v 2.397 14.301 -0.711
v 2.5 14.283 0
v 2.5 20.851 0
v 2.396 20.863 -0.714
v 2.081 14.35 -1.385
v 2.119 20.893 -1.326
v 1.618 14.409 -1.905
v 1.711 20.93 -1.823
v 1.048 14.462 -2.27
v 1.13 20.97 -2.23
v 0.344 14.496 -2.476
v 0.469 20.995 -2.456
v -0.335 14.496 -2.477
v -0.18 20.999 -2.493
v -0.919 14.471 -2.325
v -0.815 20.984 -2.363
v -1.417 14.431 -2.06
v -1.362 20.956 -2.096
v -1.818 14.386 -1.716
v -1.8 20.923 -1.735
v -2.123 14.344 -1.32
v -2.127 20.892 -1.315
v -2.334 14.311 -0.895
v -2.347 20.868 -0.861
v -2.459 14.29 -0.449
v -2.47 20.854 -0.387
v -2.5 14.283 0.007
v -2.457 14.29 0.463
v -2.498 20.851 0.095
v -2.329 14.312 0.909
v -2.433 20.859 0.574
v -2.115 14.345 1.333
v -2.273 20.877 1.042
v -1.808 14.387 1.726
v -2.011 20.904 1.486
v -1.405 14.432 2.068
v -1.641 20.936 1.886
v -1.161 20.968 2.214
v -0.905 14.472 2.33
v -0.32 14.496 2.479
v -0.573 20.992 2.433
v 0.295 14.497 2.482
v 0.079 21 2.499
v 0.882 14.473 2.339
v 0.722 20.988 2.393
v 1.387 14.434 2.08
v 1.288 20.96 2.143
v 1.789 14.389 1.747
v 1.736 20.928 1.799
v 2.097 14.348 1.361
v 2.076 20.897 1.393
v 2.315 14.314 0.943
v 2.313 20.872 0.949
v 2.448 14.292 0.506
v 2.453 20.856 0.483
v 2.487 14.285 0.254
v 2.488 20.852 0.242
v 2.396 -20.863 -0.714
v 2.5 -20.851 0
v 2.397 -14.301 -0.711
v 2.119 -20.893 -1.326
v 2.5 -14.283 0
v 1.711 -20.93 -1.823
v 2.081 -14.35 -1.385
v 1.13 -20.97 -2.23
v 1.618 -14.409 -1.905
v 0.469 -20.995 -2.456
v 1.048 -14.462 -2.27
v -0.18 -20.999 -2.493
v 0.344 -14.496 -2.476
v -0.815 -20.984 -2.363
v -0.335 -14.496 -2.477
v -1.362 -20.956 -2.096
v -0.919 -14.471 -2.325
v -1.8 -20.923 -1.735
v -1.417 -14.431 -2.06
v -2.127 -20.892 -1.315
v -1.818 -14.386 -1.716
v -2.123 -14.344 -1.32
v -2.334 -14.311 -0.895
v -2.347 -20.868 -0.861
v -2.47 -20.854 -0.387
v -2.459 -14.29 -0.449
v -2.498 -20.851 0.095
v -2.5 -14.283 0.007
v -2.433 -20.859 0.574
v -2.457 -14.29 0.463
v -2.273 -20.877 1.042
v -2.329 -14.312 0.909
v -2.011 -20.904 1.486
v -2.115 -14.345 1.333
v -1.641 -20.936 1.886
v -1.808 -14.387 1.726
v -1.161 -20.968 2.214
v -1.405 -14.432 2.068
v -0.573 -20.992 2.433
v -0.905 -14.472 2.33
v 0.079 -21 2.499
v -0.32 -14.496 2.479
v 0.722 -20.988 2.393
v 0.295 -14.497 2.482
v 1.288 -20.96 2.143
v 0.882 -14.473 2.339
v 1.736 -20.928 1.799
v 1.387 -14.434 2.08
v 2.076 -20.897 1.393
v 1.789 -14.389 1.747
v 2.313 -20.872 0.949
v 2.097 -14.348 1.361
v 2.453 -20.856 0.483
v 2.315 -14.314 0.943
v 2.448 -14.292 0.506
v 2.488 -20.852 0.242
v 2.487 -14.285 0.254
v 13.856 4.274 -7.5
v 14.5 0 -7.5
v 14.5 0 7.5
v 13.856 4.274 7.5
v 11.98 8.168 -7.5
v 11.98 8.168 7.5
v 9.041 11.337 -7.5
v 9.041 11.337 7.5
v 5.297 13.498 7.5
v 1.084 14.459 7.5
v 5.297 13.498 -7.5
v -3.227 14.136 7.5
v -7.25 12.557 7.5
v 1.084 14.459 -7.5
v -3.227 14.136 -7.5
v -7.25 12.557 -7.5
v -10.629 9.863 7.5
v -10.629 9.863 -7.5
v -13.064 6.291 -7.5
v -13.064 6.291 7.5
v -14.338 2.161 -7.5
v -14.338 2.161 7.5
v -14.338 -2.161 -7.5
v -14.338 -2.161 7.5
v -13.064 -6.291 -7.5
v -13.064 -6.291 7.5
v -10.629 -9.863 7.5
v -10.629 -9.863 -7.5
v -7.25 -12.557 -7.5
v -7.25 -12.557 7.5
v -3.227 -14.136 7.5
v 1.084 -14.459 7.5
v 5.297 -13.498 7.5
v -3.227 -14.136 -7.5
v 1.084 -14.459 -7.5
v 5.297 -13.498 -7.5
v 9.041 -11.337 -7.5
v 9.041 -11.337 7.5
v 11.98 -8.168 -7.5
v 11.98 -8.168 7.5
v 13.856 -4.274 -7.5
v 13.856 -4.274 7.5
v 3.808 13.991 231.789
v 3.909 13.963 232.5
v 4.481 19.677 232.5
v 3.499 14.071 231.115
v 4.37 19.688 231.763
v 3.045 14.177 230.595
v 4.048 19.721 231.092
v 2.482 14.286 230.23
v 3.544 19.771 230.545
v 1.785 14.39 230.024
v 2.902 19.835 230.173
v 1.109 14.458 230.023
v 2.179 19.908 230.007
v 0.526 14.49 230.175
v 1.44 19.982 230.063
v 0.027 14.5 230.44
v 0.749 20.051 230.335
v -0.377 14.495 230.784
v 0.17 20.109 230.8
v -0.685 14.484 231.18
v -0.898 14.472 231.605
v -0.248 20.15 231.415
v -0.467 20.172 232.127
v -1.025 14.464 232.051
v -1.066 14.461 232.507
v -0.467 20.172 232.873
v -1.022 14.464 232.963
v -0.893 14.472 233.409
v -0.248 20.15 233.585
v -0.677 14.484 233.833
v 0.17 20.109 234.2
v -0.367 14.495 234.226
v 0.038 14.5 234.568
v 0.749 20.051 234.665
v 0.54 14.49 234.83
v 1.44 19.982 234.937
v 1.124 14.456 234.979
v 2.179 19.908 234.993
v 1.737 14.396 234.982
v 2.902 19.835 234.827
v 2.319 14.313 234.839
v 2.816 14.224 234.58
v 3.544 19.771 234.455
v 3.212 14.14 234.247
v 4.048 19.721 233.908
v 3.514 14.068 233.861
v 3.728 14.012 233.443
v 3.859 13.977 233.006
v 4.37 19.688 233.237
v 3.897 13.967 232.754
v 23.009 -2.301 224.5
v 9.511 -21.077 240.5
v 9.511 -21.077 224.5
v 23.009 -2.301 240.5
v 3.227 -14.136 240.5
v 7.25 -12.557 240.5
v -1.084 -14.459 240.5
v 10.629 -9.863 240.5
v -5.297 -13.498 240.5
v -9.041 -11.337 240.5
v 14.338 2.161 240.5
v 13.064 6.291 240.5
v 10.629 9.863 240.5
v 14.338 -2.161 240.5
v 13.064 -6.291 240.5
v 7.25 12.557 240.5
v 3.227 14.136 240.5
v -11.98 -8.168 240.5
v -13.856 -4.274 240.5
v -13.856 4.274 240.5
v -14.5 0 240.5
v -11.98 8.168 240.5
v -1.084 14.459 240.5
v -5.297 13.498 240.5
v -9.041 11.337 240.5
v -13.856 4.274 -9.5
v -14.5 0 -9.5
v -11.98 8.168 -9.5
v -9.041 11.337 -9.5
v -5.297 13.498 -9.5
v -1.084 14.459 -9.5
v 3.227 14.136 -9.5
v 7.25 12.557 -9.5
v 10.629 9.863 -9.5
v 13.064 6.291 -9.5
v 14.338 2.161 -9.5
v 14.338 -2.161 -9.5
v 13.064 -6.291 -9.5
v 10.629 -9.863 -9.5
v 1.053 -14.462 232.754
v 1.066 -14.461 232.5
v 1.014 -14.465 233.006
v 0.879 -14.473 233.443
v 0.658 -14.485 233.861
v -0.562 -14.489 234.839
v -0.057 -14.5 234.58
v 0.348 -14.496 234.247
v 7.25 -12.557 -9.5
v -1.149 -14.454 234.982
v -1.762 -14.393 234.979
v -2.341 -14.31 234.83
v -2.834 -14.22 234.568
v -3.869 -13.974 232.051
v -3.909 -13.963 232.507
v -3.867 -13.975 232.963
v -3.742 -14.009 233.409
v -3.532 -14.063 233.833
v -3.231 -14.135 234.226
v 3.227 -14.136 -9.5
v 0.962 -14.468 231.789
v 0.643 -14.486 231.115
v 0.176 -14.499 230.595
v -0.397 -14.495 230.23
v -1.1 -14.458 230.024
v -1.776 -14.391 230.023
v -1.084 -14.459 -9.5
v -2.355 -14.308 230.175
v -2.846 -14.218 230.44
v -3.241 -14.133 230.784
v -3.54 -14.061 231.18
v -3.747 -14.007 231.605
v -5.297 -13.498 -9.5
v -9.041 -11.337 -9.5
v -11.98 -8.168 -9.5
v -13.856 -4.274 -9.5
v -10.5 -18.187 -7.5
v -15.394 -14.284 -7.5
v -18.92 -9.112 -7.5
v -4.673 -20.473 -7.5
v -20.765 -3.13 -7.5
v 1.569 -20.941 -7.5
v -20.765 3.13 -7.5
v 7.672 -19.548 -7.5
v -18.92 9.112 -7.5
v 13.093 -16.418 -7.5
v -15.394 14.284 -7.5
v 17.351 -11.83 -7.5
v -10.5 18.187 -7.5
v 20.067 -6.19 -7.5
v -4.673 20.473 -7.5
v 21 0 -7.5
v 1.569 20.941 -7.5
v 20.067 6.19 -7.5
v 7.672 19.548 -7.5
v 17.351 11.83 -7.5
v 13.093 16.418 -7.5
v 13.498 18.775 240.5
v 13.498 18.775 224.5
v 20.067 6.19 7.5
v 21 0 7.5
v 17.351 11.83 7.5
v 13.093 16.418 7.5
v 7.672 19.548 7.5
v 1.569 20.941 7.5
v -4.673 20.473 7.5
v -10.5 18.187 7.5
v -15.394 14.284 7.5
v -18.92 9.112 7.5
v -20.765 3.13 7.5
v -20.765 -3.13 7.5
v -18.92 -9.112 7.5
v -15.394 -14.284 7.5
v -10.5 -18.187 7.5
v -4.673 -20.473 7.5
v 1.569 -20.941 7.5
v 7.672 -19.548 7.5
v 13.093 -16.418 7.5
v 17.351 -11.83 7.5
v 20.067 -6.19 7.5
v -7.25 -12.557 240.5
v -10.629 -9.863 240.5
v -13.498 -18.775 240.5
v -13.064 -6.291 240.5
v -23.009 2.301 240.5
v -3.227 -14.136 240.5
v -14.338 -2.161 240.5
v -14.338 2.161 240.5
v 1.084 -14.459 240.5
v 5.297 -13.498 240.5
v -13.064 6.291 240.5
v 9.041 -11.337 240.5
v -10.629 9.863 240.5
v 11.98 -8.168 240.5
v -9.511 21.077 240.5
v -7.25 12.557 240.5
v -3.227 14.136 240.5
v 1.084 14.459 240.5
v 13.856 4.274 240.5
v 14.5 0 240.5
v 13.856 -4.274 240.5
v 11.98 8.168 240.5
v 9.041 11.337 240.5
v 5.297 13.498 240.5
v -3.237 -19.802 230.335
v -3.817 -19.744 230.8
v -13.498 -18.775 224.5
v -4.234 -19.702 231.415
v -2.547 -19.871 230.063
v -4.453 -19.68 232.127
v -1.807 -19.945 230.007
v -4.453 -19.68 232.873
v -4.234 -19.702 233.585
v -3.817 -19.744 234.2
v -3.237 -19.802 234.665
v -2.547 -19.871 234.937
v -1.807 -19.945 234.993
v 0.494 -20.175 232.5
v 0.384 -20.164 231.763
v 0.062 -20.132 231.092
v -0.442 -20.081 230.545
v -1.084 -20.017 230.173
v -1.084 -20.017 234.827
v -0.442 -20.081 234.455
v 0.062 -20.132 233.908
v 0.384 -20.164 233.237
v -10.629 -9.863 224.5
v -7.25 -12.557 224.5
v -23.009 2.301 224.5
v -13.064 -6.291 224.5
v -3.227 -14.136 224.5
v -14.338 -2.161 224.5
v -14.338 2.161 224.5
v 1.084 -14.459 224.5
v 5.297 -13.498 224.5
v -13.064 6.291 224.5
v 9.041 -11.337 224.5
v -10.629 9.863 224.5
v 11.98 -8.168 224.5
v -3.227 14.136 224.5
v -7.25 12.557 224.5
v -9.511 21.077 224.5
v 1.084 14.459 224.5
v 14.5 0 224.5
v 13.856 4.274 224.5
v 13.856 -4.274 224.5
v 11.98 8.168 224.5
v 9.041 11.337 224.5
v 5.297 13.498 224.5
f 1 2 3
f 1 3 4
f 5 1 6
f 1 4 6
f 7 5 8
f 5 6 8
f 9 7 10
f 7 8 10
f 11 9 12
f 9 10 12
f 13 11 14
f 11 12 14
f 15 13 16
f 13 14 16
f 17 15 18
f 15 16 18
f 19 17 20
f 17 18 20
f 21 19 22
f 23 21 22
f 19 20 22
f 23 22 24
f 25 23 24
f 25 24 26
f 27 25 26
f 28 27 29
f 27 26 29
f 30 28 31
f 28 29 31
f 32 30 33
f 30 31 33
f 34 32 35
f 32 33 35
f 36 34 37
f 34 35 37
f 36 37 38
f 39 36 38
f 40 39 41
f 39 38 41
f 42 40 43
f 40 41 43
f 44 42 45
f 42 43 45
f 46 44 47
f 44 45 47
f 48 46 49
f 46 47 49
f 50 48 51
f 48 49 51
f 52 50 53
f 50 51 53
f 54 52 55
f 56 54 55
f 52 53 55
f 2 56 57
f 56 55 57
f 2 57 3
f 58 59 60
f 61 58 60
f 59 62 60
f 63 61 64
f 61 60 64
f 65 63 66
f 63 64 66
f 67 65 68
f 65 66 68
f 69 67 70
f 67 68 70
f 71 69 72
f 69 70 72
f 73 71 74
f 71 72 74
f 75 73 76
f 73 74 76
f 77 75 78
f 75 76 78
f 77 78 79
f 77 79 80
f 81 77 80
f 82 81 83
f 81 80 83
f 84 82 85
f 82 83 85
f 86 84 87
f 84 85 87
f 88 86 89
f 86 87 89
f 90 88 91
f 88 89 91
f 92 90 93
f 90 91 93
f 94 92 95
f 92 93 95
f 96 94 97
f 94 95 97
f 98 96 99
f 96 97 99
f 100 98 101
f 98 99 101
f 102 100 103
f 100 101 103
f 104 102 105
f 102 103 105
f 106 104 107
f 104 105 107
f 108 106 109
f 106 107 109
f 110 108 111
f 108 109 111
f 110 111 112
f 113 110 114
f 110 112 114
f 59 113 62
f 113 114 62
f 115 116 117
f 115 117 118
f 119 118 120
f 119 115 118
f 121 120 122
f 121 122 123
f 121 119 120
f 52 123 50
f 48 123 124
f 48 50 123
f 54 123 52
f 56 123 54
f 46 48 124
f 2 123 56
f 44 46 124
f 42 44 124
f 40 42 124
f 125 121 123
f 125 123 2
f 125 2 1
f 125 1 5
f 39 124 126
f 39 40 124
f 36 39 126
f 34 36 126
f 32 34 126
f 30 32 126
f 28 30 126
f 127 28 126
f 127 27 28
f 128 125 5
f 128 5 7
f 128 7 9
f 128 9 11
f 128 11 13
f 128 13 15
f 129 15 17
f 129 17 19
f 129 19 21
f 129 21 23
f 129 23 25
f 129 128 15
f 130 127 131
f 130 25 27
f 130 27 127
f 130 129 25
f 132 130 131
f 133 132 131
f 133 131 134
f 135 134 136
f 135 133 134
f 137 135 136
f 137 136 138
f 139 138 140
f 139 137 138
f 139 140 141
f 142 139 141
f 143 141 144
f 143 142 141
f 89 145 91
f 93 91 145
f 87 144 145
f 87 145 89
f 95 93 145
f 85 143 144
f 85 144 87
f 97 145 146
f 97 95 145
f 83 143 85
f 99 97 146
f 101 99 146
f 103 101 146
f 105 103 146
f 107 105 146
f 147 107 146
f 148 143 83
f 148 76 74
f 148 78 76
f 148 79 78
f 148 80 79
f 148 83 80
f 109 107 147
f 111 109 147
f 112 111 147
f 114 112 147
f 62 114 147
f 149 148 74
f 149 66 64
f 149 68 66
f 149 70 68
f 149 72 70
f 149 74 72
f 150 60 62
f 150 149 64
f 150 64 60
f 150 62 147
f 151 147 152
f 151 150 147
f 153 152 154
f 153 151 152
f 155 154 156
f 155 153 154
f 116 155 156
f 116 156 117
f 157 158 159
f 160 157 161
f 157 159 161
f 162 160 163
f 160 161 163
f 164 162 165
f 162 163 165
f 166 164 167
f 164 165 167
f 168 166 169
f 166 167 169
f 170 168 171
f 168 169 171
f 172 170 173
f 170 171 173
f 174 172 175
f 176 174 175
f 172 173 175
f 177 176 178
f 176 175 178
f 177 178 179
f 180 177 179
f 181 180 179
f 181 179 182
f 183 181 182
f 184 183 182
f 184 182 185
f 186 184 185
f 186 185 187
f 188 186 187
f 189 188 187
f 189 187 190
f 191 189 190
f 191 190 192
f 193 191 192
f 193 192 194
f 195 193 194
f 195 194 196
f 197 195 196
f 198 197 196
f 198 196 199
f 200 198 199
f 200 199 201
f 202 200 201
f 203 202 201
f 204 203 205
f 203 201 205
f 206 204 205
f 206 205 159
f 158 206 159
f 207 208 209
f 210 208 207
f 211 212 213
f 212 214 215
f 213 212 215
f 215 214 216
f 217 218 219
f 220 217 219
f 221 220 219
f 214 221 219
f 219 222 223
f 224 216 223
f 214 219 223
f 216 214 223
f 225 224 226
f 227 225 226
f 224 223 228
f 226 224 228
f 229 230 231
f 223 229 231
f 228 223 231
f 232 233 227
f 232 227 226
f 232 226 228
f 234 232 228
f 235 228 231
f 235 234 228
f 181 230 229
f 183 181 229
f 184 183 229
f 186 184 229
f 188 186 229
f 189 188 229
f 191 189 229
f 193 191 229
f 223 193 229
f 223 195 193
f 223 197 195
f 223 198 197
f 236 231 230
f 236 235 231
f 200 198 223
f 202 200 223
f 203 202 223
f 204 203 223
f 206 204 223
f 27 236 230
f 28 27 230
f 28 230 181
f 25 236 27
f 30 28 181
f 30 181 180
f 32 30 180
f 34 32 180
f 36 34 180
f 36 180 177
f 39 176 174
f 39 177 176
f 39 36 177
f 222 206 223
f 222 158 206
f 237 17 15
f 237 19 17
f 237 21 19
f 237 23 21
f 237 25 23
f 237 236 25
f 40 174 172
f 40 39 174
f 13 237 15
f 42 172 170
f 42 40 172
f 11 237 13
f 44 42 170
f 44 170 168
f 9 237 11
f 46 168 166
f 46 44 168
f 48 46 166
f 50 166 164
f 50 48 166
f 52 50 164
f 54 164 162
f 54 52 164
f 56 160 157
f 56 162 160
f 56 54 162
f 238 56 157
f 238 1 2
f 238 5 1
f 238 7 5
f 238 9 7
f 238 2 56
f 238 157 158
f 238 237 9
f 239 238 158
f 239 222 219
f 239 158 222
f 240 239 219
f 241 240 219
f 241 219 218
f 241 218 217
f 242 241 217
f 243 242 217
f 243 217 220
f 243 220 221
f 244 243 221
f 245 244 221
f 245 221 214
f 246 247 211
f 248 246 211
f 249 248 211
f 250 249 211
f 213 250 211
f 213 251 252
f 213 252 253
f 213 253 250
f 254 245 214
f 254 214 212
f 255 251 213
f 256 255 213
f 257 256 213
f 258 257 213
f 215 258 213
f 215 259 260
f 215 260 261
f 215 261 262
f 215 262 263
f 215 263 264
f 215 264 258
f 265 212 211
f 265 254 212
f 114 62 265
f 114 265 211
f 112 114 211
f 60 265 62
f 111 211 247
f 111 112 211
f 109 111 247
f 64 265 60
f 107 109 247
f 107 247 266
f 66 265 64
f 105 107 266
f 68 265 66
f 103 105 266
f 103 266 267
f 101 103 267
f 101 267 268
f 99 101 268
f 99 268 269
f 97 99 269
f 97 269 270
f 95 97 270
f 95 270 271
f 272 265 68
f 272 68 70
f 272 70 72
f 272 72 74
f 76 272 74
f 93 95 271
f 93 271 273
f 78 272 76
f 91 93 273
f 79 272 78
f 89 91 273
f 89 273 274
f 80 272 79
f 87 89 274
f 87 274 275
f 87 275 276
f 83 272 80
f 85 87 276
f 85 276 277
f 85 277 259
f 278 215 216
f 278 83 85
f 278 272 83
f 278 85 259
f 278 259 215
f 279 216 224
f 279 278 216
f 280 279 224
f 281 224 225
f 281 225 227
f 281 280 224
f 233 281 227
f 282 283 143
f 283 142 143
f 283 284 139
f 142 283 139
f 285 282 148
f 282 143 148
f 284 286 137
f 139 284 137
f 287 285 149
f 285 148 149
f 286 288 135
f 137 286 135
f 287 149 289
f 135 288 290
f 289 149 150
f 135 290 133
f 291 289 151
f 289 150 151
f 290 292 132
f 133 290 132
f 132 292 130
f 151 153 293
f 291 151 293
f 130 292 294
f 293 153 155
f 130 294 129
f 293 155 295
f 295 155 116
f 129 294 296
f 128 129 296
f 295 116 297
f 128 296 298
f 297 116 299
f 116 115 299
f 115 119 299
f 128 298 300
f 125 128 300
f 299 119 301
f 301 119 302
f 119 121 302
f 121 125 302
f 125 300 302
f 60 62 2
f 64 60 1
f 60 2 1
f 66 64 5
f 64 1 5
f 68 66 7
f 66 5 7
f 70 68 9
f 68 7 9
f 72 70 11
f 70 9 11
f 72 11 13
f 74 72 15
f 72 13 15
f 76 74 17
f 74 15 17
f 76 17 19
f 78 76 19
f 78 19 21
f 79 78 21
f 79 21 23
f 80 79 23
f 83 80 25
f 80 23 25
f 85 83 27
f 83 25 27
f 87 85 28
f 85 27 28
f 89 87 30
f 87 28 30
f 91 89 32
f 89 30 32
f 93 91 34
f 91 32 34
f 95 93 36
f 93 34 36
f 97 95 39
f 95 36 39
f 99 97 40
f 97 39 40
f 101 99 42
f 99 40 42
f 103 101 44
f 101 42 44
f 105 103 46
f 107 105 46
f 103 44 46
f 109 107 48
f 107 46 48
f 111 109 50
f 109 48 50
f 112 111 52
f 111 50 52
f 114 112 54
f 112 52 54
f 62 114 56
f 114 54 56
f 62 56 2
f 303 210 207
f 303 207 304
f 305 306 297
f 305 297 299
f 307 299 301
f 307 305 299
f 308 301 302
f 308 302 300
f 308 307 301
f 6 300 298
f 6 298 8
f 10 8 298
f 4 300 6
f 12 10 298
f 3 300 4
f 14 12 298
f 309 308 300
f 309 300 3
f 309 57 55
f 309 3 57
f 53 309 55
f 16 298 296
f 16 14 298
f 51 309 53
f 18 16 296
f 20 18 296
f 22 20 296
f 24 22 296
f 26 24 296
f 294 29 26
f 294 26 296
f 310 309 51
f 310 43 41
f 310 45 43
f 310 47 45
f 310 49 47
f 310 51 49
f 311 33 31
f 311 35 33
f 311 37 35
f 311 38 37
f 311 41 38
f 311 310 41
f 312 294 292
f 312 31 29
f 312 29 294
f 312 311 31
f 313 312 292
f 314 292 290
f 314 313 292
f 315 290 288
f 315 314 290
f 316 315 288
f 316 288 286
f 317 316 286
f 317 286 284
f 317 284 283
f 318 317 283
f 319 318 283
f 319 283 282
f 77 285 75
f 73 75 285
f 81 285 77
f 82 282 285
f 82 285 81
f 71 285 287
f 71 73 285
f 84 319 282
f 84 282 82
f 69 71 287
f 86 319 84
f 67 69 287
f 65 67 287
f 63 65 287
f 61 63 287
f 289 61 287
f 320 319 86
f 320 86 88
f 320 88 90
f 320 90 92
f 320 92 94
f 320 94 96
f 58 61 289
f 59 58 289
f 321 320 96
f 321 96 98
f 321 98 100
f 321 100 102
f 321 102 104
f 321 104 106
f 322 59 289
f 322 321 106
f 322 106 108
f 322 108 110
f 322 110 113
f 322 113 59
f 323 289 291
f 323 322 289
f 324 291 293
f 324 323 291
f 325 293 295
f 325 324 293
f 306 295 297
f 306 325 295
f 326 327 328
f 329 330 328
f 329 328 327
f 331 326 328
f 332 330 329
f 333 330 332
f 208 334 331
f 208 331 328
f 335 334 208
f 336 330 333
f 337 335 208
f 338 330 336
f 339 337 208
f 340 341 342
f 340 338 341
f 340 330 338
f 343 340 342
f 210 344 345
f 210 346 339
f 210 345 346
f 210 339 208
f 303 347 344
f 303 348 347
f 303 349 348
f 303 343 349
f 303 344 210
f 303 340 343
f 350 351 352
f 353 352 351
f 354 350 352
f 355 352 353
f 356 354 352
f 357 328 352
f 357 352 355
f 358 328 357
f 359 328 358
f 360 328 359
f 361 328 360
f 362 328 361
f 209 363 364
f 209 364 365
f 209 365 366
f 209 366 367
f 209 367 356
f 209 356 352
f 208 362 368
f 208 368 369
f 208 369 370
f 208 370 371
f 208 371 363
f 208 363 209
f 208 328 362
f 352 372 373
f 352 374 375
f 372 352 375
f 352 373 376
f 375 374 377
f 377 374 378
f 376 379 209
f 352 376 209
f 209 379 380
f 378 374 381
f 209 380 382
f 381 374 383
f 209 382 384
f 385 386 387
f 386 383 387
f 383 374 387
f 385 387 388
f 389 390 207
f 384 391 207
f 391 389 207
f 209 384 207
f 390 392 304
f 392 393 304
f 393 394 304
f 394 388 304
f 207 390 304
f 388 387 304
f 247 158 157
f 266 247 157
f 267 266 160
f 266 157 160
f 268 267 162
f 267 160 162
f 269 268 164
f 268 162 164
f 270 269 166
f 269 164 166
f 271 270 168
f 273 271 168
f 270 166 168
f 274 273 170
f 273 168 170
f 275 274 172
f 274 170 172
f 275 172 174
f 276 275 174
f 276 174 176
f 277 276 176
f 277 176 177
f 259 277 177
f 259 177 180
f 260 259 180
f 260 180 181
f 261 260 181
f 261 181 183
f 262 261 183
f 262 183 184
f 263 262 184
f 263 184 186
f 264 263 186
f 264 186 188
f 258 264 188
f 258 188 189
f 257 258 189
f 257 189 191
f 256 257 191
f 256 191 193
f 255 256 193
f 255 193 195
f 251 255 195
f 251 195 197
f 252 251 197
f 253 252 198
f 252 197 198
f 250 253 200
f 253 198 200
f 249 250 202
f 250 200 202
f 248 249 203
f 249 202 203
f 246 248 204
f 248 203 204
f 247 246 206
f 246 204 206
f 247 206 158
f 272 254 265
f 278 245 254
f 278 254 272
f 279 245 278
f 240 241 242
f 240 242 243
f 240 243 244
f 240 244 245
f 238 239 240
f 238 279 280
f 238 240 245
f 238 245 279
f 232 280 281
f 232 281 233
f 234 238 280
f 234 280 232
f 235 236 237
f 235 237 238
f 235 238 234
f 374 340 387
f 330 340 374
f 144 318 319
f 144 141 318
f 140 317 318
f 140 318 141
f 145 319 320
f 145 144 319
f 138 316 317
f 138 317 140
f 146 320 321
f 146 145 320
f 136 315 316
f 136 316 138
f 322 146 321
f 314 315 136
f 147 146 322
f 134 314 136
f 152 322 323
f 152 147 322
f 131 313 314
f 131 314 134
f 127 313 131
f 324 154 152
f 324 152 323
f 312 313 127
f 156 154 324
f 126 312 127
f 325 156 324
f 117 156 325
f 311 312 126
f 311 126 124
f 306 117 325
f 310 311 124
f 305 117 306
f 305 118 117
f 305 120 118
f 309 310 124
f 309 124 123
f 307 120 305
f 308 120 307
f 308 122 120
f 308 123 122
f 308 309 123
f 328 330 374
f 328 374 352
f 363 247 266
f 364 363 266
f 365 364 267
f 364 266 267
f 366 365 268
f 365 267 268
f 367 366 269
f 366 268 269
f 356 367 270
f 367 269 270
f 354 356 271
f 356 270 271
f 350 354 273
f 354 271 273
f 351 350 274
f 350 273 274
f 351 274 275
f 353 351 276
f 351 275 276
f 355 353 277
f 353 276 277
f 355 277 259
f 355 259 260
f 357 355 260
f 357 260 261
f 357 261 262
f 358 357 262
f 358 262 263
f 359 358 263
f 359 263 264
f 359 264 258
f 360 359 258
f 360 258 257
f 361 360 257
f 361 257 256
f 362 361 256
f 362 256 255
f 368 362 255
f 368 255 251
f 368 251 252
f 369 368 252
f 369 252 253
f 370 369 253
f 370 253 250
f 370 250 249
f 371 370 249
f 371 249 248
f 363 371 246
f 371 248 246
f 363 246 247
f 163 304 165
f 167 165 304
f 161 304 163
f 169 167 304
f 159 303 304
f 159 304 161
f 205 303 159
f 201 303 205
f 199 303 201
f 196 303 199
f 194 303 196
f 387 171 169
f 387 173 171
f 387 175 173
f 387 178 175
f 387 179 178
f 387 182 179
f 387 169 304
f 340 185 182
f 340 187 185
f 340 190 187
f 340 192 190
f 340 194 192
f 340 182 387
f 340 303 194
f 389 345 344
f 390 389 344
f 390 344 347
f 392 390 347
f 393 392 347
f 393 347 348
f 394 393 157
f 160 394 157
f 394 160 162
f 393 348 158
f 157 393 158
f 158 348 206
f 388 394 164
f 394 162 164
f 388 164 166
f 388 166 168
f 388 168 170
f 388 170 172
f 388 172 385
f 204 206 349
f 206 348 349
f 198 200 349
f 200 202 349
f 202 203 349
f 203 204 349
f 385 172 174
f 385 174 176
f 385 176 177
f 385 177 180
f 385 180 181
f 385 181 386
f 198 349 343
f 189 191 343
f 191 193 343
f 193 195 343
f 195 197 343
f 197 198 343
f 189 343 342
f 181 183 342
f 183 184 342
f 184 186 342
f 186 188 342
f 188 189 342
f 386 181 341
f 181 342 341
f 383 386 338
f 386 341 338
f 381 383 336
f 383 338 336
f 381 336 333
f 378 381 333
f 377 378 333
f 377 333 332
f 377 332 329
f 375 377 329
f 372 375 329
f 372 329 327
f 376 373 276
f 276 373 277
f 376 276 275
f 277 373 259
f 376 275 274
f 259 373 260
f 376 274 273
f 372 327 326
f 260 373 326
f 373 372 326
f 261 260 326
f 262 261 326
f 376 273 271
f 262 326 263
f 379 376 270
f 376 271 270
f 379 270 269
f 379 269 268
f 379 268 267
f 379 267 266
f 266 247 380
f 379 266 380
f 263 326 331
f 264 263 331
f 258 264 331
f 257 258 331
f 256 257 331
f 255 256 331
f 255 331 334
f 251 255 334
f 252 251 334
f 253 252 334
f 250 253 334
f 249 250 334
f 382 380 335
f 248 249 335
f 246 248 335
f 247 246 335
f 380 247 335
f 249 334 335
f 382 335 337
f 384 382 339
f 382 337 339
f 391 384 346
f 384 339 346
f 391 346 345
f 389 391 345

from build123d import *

# Parameters (mm, degrees)
SKETCH1_R           = 21
SKETCH1_R_2         = 14.5
BOSS_EXTRUDE1_DEPTH = 7.5
BOSS_EXTRUDE2_START = 2
SKETCH2_R           = 14.5
BOSS_EXTRUDE2_DEPTH = 250
SKETCH3_R           = 2.5
CUT_EXTRUDE1_DEPTH  = 57.5
SKETCH4_R           = 14.5
BOSS_EXTRUDE3_DEPTH = 16
SKETCH5_R           = 2.5
CUT_EXTRUDE2_DEPTH  = 47


with BuildPart() as part:
    # Sketch1 → Boss-Extrude1 (new body, symmetric)
    with BuildSketch(Plane.XY):
        Circle(SKETCH1_R)
        Circle(SKETCH1_R_2, mode=Mode.SUBTRACT)
    extrude(amount=BOSS_EXTRUDE1_DEPTH, both=True)


with BuildPart() as body_2:
    # Sketch2 → Boss-Extrude2 (new body)
    with BuildSketch(Plane(origin=(0, 0, -7.5), x_dir=(-1, 0, 0), z_dir=(0, 0, -1)).offset(BOSS_EXTRUDE2_START)):
        Circle(SKETCH2_R)
    extrude(amount=-BOSS_EXTRUDE2_DEPTH)


with BuildPart() as cut_extrude1_tool:
    # Sketch3 → Cut-Extrude1 (new body, symmetric)
    with BuildSketch(Plane(origin=(0, 0, 0), x_dir=(1, 0, 0), z_dir=(0, 1, 0))):
        Circle(SKETCH3_R)
    extrude(amount=CUT_EXTRUDE1_DEPTH, both=True)


with BuildPart() as part_1:
    add(part.part)

    # Cut-Extrude1: cut by cut_extrude1_tool
    add(cut_extrude1_tool.part, mode=Mode.SUBTRACT)


with BuildPart() as body_2_1:
    add(body_2.part)

    # Cut-Extrude1: cut by cut_extrude1_tool
    add(cut_extrude1_tool.part, mode=Mode.SUBTRACT)


with BuildPart() as body_3:
    # Sketch4 → Boss-Extrude3 (new body)
    with BuildSketch(Plane.XY.offset(240.5)):
        Polygon((13.497510736, 18.775383524), (-9.51120373, 21.076878947), (-23.008714466, 2.301495423), (-13.497510736, -18.775383524), (9.51120373, -21.076878947), (23.008714466, -2.301495423), align=None)
        Circle(SKETCH4_R, mode=Mode.SUBTRACT)
    extrude(amount=-BOSS_EXTRUDE3_DEPTH)


with BuildPart() as cut_extrude2_tool:
    # Sketch5 → Cut-Extrude2 (new body)
    with BuildSketch(Plane(origin=(1.993153503, 19.926131236, 0), x_dir=(0.995034518, -0.099530436, 0), z_dir=(0.099530436, 0.995034518, 0))):
        with Locations((0, -232.5)):
            Circle(SKETCH5_R)
    extrude(amount=-CUT_EXTRUDE2_DEPTH)


with BuildPart() as body_2_2:
    add(body_2_1.part)

    # Cut-Extrude2: cut by cut_extrude2_tool
    add(cut_extrude2_tool.part, mode=Mode.SUBTRACT)


with BuildPart() as body_3_1:
    add(body_3.part)

    # Cut-Extrude2: cut by cut_extrude2_tool
    add(cut_extrude2_tool.part, mode=Mode.SUBTRACT)


solid = Compound([part_1.part, body_2_2.part, body_3_1.part])
